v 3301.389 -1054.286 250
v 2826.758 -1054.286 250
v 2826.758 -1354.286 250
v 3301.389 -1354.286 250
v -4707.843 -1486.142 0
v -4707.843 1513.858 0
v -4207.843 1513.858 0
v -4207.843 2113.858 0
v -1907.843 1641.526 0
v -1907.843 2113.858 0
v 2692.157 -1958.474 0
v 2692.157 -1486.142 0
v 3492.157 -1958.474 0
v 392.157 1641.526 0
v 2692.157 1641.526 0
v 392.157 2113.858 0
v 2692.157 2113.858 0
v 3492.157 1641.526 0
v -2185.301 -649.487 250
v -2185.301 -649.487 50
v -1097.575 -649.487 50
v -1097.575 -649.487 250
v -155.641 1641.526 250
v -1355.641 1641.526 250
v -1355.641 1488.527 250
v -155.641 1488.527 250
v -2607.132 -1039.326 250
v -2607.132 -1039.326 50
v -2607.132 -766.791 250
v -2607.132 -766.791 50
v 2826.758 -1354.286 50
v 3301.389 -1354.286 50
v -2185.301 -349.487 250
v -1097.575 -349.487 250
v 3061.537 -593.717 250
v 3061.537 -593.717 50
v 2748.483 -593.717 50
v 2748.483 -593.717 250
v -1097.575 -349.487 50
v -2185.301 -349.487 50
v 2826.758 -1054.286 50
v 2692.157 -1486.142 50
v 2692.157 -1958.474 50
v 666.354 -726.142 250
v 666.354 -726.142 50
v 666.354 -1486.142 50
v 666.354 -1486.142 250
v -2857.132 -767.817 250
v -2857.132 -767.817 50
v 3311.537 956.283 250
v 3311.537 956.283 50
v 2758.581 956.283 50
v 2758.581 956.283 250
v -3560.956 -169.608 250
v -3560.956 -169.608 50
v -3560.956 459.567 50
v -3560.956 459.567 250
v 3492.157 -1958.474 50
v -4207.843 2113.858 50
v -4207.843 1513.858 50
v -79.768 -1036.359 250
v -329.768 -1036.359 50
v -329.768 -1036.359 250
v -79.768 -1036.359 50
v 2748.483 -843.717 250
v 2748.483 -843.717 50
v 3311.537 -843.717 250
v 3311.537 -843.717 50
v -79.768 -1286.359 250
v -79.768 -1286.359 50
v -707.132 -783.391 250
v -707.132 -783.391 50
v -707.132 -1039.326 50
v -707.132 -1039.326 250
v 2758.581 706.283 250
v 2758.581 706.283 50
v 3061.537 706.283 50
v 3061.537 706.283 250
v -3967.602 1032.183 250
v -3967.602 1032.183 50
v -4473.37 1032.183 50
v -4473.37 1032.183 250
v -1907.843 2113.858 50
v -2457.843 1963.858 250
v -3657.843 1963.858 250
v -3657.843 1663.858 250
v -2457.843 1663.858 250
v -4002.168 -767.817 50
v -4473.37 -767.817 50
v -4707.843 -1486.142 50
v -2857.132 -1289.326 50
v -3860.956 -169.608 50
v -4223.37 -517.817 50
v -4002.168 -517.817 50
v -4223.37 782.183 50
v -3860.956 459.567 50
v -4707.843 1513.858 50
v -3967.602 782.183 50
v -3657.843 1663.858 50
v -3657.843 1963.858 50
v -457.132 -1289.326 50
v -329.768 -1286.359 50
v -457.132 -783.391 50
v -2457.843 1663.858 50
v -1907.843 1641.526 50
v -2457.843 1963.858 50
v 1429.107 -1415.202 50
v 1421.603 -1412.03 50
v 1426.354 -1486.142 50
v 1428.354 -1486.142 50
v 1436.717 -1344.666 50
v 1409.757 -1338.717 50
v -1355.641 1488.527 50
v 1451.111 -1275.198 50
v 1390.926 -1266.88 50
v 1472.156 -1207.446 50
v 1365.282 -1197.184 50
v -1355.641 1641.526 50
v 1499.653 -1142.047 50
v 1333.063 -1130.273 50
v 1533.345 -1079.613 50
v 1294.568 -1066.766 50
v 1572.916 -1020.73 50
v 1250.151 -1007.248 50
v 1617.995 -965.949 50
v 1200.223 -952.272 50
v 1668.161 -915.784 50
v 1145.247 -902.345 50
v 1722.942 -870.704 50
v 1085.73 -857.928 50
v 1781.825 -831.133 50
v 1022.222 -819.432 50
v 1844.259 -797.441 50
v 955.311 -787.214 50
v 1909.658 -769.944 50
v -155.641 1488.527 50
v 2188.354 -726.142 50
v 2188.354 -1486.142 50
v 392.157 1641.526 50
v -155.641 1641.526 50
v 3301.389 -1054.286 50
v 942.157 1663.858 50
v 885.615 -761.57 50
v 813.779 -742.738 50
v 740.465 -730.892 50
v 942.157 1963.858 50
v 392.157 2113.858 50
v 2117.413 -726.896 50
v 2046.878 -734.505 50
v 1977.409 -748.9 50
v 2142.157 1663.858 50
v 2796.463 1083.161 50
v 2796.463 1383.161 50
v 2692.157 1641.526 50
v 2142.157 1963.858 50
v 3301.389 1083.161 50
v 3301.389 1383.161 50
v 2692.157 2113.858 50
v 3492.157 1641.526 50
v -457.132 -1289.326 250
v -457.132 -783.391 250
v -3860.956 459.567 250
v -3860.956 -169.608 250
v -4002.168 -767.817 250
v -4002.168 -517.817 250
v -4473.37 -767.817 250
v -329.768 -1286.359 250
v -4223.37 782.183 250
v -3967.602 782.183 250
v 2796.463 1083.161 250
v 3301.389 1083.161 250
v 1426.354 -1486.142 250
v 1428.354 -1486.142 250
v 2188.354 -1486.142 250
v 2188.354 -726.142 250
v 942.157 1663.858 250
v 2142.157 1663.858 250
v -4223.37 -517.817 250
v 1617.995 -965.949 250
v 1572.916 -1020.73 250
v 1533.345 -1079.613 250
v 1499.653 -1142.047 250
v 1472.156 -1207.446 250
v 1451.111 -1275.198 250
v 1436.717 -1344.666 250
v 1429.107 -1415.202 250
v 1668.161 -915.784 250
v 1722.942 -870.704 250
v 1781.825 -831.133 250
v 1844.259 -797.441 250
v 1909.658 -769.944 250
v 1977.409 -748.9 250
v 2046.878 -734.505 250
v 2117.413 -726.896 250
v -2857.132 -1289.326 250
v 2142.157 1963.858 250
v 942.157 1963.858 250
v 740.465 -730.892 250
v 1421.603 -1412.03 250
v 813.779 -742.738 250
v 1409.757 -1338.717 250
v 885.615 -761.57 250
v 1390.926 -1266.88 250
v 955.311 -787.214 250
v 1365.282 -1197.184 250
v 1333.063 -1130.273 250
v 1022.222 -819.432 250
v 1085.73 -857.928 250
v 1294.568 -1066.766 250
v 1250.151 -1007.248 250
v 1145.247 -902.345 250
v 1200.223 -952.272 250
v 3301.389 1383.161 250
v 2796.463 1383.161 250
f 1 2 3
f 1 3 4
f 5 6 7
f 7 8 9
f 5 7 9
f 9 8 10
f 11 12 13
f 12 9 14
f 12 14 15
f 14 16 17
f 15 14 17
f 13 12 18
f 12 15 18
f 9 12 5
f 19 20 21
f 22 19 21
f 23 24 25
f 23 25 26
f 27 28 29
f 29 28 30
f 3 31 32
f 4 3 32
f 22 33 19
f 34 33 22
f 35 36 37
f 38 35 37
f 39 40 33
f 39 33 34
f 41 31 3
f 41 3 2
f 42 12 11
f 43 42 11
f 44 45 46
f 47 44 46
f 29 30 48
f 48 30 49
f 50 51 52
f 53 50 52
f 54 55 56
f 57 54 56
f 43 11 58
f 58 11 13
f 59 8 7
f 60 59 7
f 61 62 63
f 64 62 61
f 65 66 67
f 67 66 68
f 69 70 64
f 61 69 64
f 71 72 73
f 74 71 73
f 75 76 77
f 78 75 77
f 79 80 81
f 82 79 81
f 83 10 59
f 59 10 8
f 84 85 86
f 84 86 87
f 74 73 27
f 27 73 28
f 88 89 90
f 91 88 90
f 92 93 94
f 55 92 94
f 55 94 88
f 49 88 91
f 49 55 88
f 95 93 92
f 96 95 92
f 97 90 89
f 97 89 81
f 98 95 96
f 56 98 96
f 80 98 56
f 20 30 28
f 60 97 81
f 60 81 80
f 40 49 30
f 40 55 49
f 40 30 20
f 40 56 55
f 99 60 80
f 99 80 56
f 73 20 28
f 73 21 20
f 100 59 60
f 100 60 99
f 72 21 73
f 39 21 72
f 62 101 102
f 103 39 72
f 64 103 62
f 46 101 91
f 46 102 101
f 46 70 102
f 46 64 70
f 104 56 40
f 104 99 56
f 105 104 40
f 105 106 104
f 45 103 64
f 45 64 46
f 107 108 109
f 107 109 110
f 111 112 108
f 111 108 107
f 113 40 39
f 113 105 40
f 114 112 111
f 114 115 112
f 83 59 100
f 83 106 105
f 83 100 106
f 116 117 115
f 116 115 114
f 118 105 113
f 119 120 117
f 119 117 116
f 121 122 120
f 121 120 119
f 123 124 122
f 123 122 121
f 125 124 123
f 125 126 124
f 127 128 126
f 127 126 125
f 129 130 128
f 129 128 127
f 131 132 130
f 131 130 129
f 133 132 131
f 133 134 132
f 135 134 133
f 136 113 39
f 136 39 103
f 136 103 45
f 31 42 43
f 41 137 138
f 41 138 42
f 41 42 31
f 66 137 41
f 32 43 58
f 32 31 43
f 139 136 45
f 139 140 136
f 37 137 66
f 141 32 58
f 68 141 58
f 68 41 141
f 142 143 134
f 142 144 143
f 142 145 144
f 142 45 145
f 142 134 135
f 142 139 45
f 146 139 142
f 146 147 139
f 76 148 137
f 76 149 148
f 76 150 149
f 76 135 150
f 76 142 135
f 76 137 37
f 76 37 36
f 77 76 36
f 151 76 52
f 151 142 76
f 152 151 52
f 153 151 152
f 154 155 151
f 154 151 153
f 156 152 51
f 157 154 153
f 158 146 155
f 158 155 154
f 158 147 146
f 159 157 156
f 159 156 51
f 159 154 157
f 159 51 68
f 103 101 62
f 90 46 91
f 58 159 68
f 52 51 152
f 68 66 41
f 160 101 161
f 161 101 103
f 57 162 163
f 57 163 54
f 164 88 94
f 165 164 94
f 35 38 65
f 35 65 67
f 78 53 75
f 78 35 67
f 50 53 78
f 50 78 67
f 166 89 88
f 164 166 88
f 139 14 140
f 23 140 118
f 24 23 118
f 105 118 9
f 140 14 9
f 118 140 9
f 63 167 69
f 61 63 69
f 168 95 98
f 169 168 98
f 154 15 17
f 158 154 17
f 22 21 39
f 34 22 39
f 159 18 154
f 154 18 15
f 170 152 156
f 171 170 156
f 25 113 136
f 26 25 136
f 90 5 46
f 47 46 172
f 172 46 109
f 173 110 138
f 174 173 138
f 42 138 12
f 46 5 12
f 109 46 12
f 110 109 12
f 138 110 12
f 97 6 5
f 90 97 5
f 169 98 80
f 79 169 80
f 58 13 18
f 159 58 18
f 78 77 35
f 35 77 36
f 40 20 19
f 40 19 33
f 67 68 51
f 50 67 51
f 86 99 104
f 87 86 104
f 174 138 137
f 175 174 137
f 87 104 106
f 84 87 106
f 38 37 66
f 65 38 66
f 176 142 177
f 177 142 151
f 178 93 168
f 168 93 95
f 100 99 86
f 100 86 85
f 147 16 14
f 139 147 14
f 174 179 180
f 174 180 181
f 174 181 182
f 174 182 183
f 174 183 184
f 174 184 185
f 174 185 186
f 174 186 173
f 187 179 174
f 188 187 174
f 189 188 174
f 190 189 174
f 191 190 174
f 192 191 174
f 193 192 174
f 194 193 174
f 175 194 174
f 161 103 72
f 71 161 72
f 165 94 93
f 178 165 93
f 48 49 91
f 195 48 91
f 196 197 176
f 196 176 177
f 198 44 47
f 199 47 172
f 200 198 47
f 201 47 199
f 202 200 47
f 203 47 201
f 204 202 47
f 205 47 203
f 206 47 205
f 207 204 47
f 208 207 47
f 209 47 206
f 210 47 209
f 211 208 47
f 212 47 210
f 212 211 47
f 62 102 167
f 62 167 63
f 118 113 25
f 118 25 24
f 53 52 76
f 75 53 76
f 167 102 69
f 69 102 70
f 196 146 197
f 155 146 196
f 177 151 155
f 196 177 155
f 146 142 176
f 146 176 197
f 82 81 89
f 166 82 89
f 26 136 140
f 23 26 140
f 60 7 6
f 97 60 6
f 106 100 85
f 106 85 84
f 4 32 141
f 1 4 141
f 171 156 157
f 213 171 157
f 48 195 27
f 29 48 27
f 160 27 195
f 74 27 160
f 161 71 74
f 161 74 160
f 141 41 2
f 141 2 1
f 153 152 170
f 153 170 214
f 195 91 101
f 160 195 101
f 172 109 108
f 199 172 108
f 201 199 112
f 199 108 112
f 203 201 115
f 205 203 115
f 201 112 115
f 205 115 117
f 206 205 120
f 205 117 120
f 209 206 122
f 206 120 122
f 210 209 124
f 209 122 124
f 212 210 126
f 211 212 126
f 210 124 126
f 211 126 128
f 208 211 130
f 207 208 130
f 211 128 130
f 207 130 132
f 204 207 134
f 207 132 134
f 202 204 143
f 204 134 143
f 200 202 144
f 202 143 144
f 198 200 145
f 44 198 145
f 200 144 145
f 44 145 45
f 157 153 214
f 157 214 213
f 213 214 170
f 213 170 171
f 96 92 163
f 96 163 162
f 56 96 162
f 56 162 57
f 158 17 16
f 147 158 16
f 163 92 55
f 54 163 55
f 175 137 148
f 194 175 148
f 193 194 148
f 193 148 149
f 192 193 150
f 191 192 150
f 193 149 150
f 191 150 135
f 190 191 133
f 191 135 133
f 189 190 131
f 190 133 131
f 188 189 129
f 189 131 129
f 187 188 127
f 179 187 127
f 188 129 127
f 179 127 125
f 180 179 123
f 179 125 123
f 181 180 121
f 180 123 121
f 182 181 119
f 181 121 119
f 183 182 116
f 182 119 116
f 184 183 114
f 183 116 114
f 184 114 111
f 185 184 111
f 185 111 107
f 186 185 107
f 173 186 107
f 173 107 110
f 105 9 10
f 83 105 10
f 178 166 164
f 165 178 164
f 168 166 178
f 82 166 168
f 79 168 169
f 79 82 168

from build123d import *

# Parameters (mm, degrees)
F1_DEPTH = 50
F2_W     = 1200
F2_H     = 300
F2_W_2   = 300
F2_H_2   = 629.1752159595
F2_W_3   = 1087.7267122269
F2_W_4   = 250
F2_H_3   = 250
F2_H_4   = 152.9987954981
F2_W_5   = 504.9269199371
F2_W_6   = 474.6313095093
F3_DEPTH = 200
F4_DEPTH = 200


# Not quite as in the source:
# - a feature names something its author has since deleted; it is built from what else it names


with BuildPart() as f1:
    # F0 (on Top) → F1 (new body)
    with BuildSketch(Plane.XY):
        Polygon((-4707.8431632393, 1513.8580155657), (-4707.8431632393, -1486.1419844343), (2692.1568367607, -1486.1419844343), (2692.1568367607, -1958.4740257375), (3492.1568367607, -1958.4740257375), (3492.1568367607, 1641.5259742625), (2692.1568367607, 1641.5259742625), (2692.1568367607, 2113.8580155657), (392.1568367607, 2113.8580155657), (392.1568367607, 1641.5259742625), (-1907.8431632393, 1641.5259742625), (-1907.8431632393, 2113.8580155657), (-4207.8431632393, 2113.8580155657), (-4207.8431632393, 1513.8580155657), align=None)
    extrude(amount=F1_DEPTH)

    # F2 (on face) → F3 (join)
    with BuildSketch(Plane.XY.offset(50)):
        with Locations((-3057.8431632393, 1813.8580155657)):
            Rectangle(F2_W, F2_H)
        Polygon((-3967.6023748444, 782.182643881), (-3967.6023748444, 1032.182643881), (-4473.3698458788, 1032.182643881), (-4473.3698458788, -767.817356119), (-4002.1681580892, -767.817356119), (-4002.1681580892, -517.817356119), (-4223.3698458788, -517.817356119), (-4223.3698458788, 782.182643881), align=None)
        with Locations((-3710.9555244446, 144.9798196554)):
            Rectangle(F2_W_2, F2_H_2)
        Polygon((-2607.132434845, -766.7910456657), (-2857.132434845, -767.817356119), (-2857.132434845, -1289.3264293671), (-457.132434845, -1289.3264293671), (-457.132434845, -783.3907008171), (-707.132434845, -783.3907008171), (-707.132434845, -1039.3264293671), (-2607.132434845, -1039.3264293671), align=None)
        with Locations((-1641.4379477501, -499.4871973991)):
            Rectangle(F2_W_3, F2_H)
        with Locations((-204.7675848007, -1161.3585650921)):
            Rectangle(F2_W_4, F2_H_3)
        with Locations((-755.6409478188, 1565.0265765134)):
            Rectangle(F2_W, F2_H_4)
        with Locations((3048.9259958267, 1233.1605195999)):
            Rectangle(F2_W_5, F2_H)
        Polygon((3311.5372657776, 956.2834382057), (2758.581161499, 956.2834382057), (2758.581161499, 706.2834382057), (3061.5372657776, 706.2834382057), (3061.5372657776, -593.7165617943), (2748.4827041626, -593.7165617943), (2748.4827041626, -843.7165617943), (3311.5372657776, -843.7165617943), align=None)
        with Locations((3064.0738010406, -1204.2857170105)):
            Rectangle(F2_W_6, F2_H)
    extrude(amount=F3_DEPTH)

    # F2 (on face) → F4 (join)
    with BuildSketch(Plane.XY.offset(50)):
        with Locations((-3057.8431632393, 1813.8580155657)):
            Rectangle(F2_W, F2_H)
        Polygon((-3967.6023748444, 782.182643881), (-3967.6023748444, 1032.182643881), (-4473.3698458788, 1032.182643881), (-4473.3698458788, -767.817356119), (-4002.1681580892, -767.817356119), (-4002.1681580892, -517.817356119), (-4223.3698458788, -517.817356119), (-4223.3698458788, 782.182643881), align=None)
        with Locations((-3710.9555244446, 144.9798196554)):
            Rectangle(F2_W_2, F2_H_2)
        Polygon((-2607.132434845, -766.7910456657), (-2857.132434845, -767.817356119), (-2857.132434845, -1289.3264293671), (-457.132434845, -1289.3264293671), (-457.132434845, -783.3907008171), (-707.132434845, -783.3907008171), (-707.132434845, -1039.3264293671), (-2607.132434845, -1039.3264293671), align=None)
        with Locations((-1641.4379477501, -499.4871973991)):
            Rectangle(F2_W_3, F2_H)
        with Locations((-204.7675848007, -1161.3585650921)):
            Rectangle(F2_W_4, F2_H_3)
        with Locations((-755.6409478188, 1565.0265765134)):
            Rectangle(F2_W, F2_H_4)
        with Locations((1542.1568367607, 1813.8580155657)):
            Rectangle(F2_W, F2_H)
        with Locations((3048.9259958267, 1233.1605195999)):
            Rectangle(F2_W_5, F2_H)
        Polygon((3311.5372657776, 956.2834382057), (2758.581161499, 956.2834382057), (2758.581161499, 706.2834382057), (3061.5372657776, 706.2834382057), (3061.5372657776, -593.7165617943), (2748.4827041626, -593.7165617943), (2748.4827041626, -843.7165617943), (3311.5372657776, -843.7165617943), align=None)
        with Locations((3064.0738010406, -1204.2857170105)):
            Rectangle(F2_W_6, F2_H)
        with BuildLine():
            Line((666.3535618782, -726.1419844343), (666.3535618782, -1486.1419844343))
            Line((666.3535618782, -1486.1419844343), (1426.3535618782, -1486.1419844343))
            ThreePointArc((1426.3535618782, -1486.1419844343), (1200.2233986174, -952.2721476951), (666.3535618782, -726.1419844343))
        make_face()
        with BuildLine():
            Line((1428.3535618782, -1486.1419844343), (2188.3535618782, -1486.1419844343))
            Line((2188.3535618782, -1486.1419844343), (2188.3535618782, -726.1419844343))
            ThreePointArc((2188.3535618782, -726.1419844343), (1642.4705952714, -940.2590178275), (1428.3535618782, -1486.1419844343))
        make_face()
    extrude(amount=F4_DEPTH)


solid = f1.part
